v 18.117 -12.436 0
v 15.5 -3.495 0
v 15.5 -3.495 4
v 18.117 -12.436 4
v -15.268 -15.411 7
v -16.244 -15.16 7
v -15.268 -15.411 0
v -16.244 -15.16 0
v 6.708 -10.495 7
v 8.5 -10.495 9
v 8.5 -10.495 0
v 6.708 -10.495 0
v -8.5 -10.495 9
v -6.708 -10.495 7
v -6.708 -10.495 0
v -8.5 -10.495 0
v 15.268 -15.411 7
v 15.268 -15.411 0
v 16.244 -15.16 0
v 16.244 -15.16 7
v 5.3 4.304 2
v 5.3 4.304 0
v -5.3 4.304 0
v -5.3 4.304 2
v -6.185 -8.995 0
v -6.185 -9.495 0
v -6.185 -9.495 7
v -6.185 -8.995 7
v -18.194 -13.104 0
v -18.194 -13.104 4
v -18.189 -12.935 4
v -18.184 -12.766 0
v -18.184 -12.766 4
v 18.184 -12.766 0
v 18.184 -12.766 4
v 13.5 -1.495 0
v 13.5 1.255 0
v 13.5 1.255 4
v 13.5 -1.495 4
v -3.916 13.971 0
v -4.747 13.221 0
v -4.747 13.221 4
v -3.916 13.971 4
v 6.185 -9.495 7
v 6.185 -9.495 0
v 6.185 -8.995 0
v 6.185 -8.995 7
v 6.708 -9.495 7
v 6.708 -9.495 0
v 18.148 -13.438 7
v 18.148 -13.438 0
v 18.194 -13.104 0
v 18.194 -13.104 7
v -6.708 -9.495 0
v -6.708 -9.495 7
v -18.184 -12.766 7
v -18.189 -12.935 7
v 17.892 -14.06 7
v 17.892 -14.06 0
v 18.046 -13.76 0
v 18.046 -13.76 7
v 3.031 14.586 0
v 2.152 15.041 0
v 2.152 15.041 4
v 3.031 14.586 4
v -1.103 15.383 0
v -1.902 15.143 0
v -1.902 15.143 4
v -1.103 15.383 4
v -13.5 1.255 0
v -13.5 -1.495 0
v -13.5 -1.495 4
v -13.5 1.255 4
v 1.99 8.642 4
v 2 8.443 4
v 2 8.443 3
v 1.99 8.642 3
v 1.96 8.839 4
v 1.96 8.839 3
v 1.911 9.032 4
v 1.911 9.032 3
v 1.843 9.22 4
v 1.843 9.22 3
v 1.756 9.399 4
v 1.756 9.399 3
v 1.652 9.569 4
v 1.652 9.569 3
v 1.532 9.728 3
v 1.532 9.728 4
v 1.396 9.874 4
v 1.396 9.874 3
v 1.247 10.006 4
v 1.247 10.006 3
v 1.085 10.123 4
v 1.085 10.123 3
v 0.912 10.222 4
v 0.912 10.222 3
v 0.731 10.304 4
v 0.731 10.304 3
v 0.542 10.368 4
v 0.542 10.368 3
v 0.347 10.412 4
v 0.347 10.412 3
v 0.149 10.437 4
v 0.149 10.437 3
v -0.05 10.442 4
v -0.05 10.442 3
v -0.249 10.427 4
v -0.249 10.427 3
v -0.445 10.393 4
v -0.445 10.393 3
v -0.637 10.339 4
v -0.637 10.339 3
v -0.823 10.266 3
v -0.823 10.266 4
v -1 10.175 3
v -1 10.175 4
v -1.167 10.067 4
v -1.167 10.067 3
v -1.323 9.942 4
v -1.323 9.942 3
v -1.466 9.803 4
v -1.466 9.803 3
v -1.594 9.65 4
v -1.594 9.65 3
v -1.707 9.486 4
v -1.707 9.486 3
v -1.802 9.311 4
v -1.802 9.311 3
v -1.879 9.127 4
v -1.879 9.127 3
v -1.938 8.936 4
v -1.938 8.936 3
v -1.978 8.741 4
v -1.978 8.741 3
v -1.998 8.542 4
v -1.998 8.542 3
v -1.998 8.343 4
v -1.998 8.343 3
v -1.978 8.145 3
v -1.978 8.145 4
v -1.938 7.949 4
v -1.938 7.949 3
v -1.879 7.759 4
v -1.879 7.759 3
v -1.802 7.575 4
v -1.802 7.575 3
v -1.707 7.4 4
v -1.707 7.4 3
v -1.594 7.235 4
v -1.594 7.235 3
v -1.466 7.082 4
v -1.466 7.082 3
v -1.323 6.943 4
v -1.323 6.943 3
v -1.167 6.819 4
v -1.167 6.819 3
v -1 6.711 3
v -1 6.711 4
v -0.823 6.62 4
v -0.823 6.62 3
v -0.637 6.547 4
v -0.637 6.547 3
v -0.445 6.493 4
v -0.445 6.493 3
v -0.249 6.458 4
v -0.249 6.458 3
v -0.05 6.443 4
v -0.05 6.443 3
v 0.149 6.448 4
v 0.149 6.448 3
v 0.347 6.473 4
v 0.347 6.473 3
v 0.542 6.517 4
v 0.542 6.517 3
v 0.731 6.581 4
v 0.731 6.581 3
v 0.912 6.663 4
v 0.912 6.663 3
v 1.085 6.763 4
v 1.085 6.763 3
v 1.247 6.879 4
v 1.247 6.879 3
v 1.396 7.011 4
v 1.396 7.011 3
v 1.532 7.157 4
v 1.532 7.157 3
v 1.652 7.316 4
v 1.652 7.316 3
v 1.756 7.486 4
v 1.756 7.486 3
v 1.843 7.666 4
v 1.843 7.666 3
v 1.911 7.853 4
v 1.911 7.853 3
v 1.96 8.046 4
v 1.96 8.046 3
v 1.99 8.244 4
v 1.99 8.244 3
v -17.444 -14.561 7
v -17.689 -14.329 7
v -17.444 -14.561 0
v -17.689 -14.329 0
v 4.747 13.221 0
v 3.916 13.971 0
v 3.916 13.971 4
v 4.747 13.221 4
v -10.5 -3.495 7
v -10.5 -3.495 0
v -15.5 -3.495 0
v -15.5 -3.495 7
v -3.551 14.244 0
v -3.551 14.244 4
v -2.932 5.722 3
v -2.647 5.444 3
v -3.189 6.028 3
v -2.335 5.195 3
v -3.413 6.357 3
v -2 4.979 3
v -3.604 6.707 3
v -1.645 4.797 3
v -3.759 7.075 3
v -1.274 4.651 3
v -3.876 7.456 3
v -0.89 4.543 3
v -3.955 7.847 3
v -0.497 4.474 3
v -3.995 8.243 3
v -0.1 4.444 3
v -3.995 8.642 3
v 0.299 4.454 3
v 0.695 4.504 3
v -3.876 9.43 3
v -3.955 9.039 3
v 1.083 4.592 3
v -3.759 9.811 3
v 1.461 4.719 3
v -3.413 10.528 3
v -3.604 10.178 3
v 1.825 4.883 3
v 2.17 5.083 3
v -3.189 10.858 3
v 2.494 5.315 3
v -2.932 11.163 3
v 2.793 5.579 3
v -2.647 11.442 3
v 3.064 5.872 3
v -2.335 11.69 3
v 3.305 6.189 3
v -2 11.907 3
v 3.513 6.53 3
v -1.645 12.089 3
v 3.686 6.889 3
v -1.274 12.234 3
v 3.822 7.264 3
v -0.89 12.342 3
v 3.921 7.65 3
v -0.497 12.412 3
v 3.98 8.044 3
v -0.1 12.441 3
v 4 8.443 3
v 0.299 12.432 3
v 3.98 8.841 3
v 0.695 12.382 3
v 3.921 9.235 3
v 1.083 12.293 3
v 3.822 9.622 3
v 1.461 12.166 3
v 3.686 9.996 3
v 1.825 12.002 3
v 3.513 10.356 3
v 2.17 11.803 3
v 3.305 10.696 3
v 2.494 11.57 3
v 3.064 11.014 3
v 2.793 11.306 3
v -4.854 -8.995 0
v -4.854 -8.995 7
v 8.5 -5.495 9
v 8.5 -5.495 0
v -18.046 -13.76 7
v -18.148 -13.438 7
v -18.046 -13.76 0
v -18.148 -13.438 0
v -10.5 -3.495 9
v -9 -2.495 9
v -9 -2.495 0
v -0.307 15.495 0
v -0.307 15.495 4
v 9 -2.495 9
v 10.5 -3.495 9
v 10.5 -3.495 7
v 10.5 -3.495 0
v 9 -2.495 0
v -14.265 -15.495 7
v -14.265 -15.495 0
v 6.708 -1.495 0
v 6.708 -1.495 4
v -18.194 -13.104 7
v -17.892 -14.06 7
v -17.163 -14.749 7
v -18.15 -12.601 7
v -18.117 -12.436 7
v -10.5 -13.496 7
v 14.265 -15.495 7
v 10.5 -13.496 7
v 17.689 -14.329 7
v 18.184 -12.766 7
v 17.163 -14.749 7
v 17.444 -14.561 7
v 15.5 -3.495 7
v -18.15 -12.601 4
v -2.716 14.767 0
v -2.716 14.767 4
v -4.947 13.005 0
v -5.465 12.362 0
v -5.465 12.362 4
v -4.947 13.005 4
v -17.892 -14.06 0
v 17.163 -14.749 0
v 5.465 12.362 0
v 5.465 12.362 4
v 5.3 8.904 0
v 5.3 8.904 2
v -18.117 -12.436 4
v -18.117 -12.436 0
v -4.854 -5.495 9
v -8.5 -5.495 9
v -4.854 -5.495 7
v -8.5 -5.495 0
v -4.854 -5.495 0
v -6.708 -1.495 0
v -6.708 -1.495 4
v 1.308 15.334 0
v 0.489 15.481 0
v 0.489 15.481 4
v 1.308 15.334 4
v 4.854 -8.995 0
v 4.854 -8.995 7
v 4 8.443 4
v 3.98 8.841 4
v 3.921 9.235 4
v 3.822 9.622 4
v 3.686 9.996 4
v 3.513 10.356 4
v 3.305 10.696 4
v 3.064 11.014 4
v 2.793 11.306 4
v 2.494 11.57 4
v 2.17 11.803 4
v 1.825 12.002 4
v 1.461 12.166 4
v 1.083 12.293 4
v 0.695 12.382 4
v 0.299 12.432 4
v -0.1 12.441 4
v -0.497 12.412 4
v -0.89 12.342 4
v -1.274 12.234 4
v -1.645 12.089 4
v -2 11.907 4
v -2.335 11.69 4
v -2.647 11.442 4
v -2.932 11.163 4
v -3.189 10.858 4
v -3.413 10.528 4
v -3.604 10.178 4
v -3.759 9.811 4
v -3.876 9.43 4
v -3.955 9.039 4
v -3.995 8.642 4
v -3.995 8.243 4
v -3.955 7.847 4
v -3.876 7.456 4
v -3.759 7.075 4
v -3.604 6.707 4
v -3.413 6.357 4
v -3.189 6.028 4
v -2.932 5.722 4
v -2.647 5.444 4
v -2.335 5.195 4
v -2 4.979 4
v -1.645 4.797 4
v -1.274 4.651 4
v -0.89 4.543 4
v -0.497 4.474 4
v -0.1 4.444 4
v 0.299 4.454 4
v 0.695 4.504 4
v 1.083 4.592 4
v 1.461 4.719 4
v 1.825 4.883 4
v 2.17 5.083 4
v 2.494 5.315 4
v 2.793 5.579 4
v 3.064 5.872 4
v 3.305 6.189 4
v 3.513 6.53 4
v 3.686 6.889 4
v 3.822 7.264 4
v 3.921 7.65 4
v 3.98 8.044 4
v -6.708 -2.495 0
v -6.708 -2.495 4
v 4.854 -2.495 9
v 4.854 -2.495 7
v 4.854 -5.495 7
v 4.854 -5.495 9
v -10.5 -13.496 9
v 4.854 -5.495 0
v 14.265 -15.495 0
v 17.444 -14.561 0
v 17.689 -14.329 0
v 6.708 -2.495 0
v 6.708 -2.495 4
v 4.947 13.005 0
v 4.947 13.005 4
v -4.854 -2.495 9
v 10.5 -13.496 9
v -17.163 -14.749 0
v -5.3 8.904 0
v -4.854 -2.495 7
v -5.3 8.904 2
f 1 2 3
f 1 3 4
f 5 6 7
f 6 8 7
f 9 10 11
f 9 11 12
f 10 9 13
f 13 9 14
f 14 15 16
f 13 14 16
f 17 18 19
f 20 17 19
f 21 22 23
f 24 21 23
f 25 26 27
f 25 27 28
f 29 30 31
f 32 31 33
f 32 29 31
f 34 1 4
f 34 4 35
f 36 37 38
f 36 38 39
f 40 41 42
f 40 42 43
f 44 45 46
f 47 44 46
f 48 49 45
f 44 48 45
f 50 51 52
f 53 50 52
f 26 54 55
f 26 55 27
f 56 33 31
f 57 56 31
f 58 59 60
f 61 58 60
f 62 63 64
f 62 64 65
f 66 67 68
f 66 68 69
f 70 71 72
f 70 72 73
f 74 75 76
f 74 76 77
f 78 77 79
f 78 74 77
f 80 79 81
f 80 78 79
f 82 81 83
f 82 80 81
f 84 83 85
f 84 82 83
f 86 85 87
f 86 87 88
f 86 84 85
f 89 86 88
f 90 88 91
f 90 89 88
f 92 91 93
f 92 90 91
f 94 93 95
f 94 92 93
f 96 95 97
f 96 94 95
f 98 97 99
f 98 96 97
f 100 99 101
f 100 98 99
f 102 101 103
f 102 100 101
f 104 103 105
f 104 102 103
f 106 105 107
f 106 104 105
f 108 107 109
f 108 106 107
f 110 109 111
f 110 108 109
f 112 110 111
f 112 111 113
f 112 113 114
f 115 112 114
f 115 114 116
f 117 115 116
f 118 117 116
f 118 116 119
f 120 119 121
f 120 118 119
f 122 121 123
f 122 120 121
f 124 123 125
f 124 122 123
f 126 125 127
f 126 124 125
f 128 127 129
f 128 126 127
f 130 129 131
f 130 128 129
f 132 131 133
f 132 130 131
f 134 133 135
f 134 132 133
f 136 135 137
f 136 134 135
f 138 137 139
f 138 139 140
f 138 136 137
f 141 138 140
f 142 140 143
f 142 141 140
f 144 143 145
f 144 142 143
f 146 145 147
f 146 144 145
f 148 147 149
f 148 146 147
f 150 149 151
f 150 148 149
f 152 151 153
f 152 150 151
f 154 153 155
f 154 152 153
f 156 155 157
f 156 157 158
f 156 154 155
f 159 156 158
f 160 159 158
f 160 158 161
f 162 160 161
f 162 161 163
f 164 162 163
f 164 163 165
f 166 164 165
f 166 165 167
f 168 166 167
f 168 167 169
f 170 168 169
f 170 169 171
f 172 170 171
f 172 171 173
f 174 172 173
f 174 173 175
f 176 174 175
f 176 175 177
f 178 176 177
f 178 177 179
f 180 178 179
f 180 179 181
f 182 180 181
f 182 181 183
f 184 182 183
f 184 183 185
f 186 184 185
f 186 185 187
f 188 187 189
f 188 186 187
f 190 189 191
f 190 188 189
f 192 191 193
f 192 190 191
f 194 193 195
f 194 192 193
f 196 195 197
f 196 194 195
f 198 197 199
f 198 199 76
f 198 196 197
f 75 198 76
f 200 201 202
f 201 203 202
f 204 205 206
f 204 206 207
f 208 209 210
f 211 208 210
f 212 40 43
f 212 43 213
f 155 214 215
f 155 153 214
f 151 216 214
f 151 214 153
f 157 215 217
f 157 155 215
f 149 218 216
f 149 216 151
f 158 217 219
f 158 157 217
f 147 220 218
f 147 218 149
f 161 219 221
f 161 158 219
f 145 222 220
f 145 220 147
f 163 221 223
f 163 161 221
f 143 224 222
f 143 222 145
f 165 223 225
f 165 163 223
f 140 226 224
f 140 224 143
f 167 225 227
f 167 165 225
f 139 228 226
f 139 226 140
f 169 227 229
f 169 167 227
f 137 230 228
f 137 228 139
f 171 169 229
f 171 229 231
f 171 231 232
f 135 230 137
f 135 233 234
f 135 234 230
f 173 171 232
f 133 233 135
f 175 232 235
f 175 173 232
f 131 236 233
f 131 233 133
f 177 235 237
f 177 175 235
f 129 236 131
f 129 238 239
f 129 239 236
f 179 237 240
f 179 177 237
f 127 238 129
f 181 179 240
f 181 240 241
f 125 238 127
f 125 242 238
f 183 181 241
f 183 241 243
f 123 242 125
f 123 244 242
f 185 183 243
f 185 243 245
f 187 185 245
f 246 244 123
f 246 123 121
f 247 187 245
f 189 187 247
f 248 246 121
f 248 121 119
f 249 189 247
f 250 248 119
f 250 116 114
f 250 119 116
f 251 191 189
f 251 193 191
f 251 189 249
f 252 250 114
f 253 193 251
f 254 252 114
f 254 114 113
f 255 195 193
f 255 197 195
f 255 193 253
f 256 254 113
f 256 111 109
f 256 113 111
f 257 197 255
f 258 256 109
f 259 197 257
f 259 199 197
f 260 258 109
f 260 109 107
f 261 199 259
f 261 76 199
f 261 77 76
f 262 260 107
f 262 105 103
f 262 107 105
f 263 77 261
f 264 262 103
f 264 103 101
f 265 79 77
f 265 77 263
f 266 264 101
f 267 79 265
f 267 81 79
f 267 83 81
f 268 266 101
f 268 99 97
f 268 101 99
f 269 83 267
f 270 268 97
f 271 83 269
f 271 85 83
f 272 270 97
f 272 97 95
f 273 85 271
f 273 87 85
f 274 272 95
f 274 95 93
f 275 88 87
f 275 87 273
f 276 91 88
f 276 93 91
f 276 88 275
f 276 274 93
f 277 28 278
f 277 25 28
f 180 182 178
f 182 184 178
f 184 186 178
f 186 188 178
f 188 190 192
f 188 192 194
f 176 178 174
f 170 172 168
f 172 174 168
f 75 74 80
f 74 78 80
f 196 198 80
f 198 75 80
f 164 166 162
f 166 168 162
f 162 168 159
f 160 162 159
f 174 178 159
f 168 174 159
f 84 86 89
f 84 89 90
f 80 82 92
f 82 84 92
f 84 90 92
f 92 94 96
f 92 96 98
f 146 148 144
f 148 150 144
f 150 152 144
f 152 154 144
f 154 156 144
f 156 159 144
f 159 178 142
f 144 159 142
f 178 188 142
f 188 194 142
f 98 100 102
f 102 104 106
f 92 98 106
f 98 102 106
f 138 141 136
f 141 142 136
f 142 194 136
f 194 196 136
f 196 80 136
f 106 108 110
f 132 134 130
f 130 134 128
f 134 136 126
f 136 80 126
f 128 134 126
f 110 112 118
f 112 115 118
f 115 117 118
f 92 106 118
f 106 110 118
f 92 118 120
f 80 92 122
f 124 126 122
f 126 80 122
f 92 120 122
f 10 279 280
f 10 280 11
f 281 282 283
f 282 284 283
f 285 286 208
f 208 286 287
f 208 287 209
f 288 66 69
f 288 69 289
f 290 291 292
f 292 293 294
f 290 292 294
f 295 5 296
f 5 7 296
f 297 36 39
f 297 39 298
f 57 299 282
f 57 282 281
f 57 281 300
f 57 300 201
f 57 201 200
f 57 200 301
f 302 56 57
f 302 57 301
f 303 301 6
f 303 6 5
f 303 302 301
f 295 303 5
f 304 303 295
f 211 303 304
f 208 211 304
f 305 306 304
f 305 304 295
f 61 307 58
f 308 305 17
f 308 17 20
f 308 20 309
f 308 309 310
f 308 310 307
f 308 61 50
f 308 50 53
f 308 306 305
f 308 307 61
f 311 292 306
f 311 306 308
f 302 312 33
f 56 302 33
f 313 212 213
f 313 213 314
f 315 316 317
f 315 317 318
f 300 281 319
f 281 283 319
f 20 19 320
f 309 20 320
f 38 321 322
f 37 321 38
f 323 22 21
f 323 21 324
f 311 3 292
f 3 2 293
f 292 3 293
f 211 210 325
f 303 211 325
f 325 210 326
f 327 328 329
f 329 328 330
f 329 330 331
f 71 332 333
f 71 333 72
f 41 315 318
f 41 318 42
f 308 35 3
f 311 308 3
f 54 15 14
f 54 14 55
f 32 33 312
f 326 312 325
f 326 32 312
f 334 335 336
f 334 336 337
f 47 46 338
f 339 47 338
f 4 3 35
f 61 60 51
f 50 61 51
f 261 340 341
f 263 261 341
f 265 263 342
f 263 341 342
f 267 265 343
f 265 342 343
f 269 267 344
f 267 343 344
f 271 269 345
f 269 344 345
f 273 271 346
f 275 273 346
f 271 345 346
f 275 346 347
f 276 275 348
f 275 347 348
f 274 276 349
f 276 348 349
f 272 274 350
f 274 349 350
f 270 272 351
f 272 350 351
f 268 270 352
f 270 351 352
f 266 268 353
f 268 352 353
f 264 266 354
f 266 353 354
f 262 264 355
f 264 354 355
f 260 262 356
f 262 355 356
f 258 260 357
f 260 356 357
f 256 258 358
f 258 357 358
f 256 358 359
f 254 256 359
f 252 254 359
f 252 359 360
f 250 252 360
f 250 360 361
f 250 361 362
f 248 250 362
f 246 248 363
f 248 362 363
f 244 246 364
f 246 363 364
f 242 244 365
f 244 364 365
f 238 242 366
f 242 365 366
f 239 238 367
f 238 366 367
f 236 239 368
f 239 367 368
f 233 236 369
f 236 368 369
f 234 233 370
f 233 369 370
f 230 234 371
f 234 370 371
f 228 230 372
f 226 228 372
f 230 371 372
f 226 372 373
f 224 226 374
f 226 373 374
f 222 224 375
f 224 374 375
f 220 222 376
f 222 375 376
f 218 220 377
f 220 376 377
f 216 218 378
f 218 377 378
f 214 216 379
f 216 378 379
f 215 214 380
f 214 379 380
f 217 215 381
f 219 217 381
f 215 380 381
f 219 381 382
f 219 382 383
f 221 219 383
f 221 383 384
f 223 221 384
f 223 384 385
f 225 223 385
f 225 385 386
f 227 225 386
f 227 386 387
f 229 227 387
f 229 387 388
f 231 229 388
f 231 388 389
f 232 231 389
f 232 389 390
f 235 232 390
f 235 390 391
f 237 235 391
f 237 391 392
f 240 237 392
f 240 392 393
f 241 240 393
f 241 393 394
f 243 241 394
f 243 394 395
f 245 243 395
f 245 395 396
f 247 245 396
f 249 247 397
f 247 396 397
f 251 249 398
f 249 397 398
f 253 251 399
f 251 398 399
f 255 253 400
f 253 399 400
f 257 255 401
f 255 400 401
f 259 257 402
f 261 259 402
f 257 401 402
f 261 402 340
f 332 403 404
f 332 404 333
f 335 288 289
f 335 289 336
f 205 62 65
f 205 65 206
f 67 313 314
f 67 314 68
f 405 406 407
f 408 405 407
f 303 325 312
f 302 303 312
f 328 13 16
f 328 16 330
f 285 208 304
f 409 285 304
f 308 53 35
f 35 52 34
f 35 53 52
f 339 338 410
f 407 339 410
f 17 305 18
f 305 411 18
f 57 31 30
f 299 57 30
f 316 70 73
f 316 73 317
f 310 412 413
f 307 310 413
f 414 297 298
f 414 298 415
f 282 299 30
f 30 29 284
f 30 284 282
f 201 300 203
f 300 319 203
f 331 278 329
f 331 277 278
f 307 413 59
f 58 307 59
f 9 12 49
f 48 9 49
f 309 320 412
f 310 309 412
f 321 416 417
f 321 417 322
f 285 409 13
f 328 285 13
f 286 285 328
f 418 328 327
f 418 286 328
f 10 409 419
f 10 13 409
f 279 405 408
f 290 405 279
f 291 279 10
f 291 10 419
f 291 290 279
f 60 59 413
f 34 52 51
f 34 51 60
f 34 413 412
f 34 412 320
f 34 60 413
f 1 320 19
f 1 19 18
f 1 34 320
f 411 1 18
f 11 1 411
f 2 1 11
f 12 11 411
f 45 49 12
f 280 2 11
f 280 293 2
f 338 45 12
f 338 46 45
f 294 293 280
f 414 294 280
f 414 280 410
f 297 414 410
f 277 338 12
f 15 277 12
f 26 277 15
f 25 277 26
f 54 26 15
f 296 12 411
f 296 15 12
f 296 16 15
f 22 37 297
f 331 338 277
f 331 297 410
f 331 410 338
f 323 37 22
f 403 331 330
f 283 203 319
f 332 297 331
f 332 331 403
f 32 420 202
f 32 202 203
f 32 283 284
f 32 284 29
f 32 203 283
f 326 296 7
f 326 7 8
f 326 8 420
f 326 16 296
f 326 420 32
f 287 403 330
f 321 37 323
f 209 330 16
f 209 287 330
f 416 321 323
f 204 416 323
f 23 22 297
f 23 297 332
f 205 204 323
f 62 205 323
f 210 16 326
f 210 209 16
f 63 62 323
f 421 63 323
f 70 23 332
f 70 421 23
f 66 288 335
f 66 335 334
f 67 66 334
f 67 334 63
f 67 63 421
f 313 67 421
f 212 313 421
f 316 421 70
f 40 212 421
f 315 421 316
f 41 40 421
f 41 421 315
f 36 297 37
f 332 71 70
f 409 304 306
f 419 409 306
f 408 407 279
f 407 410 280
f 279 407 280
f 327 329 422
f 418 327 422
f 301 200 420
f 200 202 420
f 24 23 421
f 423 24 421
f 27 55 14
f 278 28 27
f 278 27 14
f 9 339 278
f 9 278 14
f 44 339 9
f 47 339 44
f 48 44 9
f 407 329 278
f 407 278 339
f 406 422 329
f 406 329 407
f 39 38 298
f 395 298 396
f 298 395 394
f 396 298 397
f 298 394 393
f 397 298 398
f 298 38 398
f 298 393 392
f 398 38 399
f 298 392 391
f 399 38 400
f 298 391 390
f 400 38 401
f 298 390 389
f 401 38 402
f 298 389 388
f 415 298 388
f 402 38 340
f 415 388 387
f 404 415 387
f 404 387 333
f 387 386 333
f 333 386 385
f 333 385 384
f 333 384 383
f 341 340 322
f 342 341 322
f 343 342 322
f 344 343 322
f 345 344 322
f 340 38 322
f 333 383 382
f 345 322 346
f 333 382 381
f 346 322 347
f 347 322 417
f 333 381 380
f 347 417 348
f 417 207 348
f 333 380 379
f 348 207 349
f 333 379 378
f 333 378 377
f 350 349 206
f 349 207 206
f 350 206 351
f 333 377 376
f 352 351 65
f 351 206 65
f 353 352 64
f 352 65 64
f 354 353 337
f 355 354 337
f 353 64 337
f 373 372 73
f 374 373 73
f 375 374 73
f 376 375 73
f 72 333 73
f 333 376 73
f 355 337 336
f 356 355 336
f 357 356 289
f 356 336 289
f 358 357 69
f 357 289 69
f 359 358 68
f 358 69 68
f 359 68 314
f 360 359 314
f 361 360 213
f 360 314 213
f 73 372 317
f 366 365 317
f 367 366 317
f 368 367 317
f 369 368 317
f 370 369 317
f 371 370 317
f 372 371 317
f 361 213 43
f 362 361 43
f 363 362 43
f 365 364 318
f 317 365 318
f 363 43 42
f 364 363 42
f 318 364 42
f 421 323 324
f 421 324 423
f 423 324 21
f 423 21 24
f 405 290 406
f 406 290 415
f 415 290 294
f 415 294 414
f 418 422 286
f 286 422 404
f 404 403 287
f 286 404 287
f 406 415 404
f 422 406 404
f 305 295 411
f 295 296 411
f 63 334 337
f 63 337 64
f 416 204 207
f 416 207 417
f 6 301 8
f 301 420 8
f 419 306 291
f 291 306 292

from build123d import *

# Parameters (mm, degrees)
BOSS_EXTRUDE1_DEPTH = 4
SKETCH4_R           = 4
SKETCH4_R_2         = 2
CUT_EXTRUDE1_DEPTH  = 1
BOSS_EXTRUDE2_DEPTH = 3
BOSS_EXTRUDE3_DEPTH = 2
SKETCH9_W           = 10.6
SKETCH9_H           = 4.6
CUT_EXTRUDE2_DEPTH  = 2


with BuildPart() as part:
    # Sketch1 → Boss-Extrude1 (new body)
    with BuildSketch(Plane.XY):
        Polygon((5.464935303, 12.361984253), (13.500030518, 1.254714966), (13.500030518, -1.495285034), (6.708221436, -1.495285034), (6.708221436, -2.495285034), (9.000030518, -2.495285034), (10.500030518, -3.495285034), (15.500030518, -3.495285034), (18.116729736, -12.435714722), (18.183807373, -12.766372681), (18.19442749, -13.103652954), (18.148162842, -13.43788147), (18.046356201, -13.759597778), (17.891937256, -14.059585571), (17.689239502, -14.329391479), (17.444122314, -14.561233521), (17.163482666, -14.74861145), (16.243865967, -15.159500122), (15.268463135, -15.410751343), (14.26473999, -15.495285034), (-14.26473999, -15.495285034), (-15.2684021, -15.410751343), (-16.243865967, -15.159500122), (-17.163482666, -14.74861145), (-17.444122314, -14.561233521), (-17.689239502, -14.329391479), (-17.891937256, -14.059585571), (-18.046356201, -13.759597778), (-18.148162842, -13.43788147), (-18.19442749, -13.103652954), (-18.183807373, -12.766372681), (-18.116729736, -12.435714722), (-15.499969482, -3.495285034), (-10.499969482, -3.495285034), (-8.999969482, -2.495285034), (-6.708221436, -2.495285034), (-6.708221436, -1.495285034), (-13.499969482, -1.495285034), (-13.499969482, 1.254714966), (-5.464935303, 12.361984253), (-4.947479248, 13.004714966), (-4.746734619, 13.221054077), (-3.915679932, 13.971450806), (-3.550689697, 14.243942261), (-2.715545654, 14.767288208), (-1.902435303, 15.142776489), (-1.102752686, 15.383102417), (-0.306915283, 15.495285034), (0.489349365, 15.480758667), (1.307891846, 15.333633423), (2.152435303, 15.041397095), (3.030548096, 14.586288452), (3.915679932, 13.971450806), (4.746795654, 13.221054077), (4.947479248, 13.004714966), align=None)
        Polygon((6.708221436, -10.495285034), (8.500030518, -10.495285034), (8.500030518, -5.495285034), (4.854156494, -5.495285034), (4.854156494, -8.995285034), (6.184661865, -8.995285034), (6.184661865, -9.495285034), (6.708221436, -9.495285034), align=None, mode=Mode.SUBTRACT)
        Polygon((-4.854095459, -5.495285034), (-8.499969482, -5.495285034), (-8.499969482, -10.495285034), (-6.708221436, -10.495285034), (-6.708221436, -9.495285034), (-6.184661865, -9.495285034), (-6.184661865, -8.995285034), (-4.854095459, -8.995285034), align=None, mode=Mode.SUBTRACT)
    extrude(amount=BOSS_EXTRUDE1_DEPTH)

    # Sketch4 → Cut-Extrude1 (cut)
    with BuildSketch(Plane.XY.offset(4)):
        with Locations((0, 8.442743212)):
            Circle(SKETCH4_R)
        with Locations((0, 8.442743212)):
            Circle(SKETCH4_R_2, mode=Mode.SUBTRACT)
    extrude(amount=-CUT_EXTRUDE1_DEPTH, mode=Mode.SUBTRACT)

    # Sketch7 → Boss-Extrude2 (add)
    with BuildSketch(Plane.XY.offset(4)):
        Polygon((-15.499969482, -3.495285034), (-18.116729736, -12.435714722), (-18.150268555, -12.601043701), (-18.183807373, -12.766372681), (-18.189117432, -12.935012817), (-18.19442749, -13.103652954), (-18.171295166, -13.270767212), (-18.148162842, -13.43788147), (-18.046356201, -13.759597778), (-17.891937256, -14.059585571), (-17.689239502, -14.329391479), (-17.444122314, -14.561233521), (-17.163482666, -14.74861145), (-16.243865967, -15.159500122), (-15.2684021, -15.410751343), (-14.26473999, -15.495285034), (14.26473999, -15.495285034), (15.268463135, -15.410751343), (16.243865967, -15.159500122), (17.163482666, -14.74861145), (17.444122314, -14.561233521), (17.689239502, -14.329391479), (17.891937256, -14.059585571), (18.046356201, -13.759597778), (18.148162842, -13.43788147), (18.19442749, -13.103652954), (18.183807373, -12.766372681), (15.500030518, -3.495285034), (10.500030518, -3.495285034), (9.000030518, -2.495285034), (6.708221436, -2.495285034), (-6.708221436, -2.495285034), (-8.999969482, -2.495285034), (-10.499969482, -3.495285034), align=None)
        Polygon((-8.499969482, -5.495285034), (-8.499969482, -10.495285034), (-6.708221436, -10.495285034), (-6.708221436, -9.495285034), (-6.184661865, -9.495285034), (-6.184661865, -8.995285034), (-4.854095459, -8.995285034), (-4.854095459, -5.495285034), align=None, mode=Mode.SUBTRACT)
        Polygon((4.854156494, -5.495285034), (8.500030518, -5.495285034), (8.500030518, -10.495285034), (6.708221436, -10.495285034), (6.708221436, -9.495285034), (6.184661865, -9.495285034), (6.184661865, -8.995285034), (4.854156494, -8.995285034), align=None, mode=Mode.SUBTRACT)
    extrude(amount=BOSS_EXTRUDE2_DEPTH)

    # Sketch8 → Boss-Extrude3 (add)
    with BuildSketch(Plane.XY.offset(7)):
        Polygon((-6.708221436, -2.495285034), (-8.999969482, -2.495285034), (-10.499969482, -3.495285034), (-10.499969482, -13.496460595), (10.500030518, -13.496460595), (10.500030518, -3.495285034), (9.000030518, -2.495285034), (6.708221436, -2.495285034), (4.854156494, -2.495285034), (4.854156494, -5.495285034), (8.500030518, -5.495285034), (8.500030518, -10.495285034), (6.708221436, -10.495285034), (-6.708221436, -10.495285034), (-8.499969482, -10.495285034), (-8.499969482, -5.495285034), (-4.854095459, -5.495285034), (-4.854095459, -2.495285034), align=None)
    extrude(amount=BOSS_EXTRUDE3_DEPTH)

    # Sketch9 → Cut-Extrude2 (cut)
    with BuildSketch(Plane(origin=(0, 0, 0), x_dir=(-1, 0, 0), z_dir=(0, 0, -1))):
        with Locations((0, 6.603957423)):
            Rectangle(SKETCH9_W, SKETCH9_H)
    extrude(amount=-CUT_EXTRUDE2_DEPTH, mode=Mode.SUBTRACT)


solid = part.part
